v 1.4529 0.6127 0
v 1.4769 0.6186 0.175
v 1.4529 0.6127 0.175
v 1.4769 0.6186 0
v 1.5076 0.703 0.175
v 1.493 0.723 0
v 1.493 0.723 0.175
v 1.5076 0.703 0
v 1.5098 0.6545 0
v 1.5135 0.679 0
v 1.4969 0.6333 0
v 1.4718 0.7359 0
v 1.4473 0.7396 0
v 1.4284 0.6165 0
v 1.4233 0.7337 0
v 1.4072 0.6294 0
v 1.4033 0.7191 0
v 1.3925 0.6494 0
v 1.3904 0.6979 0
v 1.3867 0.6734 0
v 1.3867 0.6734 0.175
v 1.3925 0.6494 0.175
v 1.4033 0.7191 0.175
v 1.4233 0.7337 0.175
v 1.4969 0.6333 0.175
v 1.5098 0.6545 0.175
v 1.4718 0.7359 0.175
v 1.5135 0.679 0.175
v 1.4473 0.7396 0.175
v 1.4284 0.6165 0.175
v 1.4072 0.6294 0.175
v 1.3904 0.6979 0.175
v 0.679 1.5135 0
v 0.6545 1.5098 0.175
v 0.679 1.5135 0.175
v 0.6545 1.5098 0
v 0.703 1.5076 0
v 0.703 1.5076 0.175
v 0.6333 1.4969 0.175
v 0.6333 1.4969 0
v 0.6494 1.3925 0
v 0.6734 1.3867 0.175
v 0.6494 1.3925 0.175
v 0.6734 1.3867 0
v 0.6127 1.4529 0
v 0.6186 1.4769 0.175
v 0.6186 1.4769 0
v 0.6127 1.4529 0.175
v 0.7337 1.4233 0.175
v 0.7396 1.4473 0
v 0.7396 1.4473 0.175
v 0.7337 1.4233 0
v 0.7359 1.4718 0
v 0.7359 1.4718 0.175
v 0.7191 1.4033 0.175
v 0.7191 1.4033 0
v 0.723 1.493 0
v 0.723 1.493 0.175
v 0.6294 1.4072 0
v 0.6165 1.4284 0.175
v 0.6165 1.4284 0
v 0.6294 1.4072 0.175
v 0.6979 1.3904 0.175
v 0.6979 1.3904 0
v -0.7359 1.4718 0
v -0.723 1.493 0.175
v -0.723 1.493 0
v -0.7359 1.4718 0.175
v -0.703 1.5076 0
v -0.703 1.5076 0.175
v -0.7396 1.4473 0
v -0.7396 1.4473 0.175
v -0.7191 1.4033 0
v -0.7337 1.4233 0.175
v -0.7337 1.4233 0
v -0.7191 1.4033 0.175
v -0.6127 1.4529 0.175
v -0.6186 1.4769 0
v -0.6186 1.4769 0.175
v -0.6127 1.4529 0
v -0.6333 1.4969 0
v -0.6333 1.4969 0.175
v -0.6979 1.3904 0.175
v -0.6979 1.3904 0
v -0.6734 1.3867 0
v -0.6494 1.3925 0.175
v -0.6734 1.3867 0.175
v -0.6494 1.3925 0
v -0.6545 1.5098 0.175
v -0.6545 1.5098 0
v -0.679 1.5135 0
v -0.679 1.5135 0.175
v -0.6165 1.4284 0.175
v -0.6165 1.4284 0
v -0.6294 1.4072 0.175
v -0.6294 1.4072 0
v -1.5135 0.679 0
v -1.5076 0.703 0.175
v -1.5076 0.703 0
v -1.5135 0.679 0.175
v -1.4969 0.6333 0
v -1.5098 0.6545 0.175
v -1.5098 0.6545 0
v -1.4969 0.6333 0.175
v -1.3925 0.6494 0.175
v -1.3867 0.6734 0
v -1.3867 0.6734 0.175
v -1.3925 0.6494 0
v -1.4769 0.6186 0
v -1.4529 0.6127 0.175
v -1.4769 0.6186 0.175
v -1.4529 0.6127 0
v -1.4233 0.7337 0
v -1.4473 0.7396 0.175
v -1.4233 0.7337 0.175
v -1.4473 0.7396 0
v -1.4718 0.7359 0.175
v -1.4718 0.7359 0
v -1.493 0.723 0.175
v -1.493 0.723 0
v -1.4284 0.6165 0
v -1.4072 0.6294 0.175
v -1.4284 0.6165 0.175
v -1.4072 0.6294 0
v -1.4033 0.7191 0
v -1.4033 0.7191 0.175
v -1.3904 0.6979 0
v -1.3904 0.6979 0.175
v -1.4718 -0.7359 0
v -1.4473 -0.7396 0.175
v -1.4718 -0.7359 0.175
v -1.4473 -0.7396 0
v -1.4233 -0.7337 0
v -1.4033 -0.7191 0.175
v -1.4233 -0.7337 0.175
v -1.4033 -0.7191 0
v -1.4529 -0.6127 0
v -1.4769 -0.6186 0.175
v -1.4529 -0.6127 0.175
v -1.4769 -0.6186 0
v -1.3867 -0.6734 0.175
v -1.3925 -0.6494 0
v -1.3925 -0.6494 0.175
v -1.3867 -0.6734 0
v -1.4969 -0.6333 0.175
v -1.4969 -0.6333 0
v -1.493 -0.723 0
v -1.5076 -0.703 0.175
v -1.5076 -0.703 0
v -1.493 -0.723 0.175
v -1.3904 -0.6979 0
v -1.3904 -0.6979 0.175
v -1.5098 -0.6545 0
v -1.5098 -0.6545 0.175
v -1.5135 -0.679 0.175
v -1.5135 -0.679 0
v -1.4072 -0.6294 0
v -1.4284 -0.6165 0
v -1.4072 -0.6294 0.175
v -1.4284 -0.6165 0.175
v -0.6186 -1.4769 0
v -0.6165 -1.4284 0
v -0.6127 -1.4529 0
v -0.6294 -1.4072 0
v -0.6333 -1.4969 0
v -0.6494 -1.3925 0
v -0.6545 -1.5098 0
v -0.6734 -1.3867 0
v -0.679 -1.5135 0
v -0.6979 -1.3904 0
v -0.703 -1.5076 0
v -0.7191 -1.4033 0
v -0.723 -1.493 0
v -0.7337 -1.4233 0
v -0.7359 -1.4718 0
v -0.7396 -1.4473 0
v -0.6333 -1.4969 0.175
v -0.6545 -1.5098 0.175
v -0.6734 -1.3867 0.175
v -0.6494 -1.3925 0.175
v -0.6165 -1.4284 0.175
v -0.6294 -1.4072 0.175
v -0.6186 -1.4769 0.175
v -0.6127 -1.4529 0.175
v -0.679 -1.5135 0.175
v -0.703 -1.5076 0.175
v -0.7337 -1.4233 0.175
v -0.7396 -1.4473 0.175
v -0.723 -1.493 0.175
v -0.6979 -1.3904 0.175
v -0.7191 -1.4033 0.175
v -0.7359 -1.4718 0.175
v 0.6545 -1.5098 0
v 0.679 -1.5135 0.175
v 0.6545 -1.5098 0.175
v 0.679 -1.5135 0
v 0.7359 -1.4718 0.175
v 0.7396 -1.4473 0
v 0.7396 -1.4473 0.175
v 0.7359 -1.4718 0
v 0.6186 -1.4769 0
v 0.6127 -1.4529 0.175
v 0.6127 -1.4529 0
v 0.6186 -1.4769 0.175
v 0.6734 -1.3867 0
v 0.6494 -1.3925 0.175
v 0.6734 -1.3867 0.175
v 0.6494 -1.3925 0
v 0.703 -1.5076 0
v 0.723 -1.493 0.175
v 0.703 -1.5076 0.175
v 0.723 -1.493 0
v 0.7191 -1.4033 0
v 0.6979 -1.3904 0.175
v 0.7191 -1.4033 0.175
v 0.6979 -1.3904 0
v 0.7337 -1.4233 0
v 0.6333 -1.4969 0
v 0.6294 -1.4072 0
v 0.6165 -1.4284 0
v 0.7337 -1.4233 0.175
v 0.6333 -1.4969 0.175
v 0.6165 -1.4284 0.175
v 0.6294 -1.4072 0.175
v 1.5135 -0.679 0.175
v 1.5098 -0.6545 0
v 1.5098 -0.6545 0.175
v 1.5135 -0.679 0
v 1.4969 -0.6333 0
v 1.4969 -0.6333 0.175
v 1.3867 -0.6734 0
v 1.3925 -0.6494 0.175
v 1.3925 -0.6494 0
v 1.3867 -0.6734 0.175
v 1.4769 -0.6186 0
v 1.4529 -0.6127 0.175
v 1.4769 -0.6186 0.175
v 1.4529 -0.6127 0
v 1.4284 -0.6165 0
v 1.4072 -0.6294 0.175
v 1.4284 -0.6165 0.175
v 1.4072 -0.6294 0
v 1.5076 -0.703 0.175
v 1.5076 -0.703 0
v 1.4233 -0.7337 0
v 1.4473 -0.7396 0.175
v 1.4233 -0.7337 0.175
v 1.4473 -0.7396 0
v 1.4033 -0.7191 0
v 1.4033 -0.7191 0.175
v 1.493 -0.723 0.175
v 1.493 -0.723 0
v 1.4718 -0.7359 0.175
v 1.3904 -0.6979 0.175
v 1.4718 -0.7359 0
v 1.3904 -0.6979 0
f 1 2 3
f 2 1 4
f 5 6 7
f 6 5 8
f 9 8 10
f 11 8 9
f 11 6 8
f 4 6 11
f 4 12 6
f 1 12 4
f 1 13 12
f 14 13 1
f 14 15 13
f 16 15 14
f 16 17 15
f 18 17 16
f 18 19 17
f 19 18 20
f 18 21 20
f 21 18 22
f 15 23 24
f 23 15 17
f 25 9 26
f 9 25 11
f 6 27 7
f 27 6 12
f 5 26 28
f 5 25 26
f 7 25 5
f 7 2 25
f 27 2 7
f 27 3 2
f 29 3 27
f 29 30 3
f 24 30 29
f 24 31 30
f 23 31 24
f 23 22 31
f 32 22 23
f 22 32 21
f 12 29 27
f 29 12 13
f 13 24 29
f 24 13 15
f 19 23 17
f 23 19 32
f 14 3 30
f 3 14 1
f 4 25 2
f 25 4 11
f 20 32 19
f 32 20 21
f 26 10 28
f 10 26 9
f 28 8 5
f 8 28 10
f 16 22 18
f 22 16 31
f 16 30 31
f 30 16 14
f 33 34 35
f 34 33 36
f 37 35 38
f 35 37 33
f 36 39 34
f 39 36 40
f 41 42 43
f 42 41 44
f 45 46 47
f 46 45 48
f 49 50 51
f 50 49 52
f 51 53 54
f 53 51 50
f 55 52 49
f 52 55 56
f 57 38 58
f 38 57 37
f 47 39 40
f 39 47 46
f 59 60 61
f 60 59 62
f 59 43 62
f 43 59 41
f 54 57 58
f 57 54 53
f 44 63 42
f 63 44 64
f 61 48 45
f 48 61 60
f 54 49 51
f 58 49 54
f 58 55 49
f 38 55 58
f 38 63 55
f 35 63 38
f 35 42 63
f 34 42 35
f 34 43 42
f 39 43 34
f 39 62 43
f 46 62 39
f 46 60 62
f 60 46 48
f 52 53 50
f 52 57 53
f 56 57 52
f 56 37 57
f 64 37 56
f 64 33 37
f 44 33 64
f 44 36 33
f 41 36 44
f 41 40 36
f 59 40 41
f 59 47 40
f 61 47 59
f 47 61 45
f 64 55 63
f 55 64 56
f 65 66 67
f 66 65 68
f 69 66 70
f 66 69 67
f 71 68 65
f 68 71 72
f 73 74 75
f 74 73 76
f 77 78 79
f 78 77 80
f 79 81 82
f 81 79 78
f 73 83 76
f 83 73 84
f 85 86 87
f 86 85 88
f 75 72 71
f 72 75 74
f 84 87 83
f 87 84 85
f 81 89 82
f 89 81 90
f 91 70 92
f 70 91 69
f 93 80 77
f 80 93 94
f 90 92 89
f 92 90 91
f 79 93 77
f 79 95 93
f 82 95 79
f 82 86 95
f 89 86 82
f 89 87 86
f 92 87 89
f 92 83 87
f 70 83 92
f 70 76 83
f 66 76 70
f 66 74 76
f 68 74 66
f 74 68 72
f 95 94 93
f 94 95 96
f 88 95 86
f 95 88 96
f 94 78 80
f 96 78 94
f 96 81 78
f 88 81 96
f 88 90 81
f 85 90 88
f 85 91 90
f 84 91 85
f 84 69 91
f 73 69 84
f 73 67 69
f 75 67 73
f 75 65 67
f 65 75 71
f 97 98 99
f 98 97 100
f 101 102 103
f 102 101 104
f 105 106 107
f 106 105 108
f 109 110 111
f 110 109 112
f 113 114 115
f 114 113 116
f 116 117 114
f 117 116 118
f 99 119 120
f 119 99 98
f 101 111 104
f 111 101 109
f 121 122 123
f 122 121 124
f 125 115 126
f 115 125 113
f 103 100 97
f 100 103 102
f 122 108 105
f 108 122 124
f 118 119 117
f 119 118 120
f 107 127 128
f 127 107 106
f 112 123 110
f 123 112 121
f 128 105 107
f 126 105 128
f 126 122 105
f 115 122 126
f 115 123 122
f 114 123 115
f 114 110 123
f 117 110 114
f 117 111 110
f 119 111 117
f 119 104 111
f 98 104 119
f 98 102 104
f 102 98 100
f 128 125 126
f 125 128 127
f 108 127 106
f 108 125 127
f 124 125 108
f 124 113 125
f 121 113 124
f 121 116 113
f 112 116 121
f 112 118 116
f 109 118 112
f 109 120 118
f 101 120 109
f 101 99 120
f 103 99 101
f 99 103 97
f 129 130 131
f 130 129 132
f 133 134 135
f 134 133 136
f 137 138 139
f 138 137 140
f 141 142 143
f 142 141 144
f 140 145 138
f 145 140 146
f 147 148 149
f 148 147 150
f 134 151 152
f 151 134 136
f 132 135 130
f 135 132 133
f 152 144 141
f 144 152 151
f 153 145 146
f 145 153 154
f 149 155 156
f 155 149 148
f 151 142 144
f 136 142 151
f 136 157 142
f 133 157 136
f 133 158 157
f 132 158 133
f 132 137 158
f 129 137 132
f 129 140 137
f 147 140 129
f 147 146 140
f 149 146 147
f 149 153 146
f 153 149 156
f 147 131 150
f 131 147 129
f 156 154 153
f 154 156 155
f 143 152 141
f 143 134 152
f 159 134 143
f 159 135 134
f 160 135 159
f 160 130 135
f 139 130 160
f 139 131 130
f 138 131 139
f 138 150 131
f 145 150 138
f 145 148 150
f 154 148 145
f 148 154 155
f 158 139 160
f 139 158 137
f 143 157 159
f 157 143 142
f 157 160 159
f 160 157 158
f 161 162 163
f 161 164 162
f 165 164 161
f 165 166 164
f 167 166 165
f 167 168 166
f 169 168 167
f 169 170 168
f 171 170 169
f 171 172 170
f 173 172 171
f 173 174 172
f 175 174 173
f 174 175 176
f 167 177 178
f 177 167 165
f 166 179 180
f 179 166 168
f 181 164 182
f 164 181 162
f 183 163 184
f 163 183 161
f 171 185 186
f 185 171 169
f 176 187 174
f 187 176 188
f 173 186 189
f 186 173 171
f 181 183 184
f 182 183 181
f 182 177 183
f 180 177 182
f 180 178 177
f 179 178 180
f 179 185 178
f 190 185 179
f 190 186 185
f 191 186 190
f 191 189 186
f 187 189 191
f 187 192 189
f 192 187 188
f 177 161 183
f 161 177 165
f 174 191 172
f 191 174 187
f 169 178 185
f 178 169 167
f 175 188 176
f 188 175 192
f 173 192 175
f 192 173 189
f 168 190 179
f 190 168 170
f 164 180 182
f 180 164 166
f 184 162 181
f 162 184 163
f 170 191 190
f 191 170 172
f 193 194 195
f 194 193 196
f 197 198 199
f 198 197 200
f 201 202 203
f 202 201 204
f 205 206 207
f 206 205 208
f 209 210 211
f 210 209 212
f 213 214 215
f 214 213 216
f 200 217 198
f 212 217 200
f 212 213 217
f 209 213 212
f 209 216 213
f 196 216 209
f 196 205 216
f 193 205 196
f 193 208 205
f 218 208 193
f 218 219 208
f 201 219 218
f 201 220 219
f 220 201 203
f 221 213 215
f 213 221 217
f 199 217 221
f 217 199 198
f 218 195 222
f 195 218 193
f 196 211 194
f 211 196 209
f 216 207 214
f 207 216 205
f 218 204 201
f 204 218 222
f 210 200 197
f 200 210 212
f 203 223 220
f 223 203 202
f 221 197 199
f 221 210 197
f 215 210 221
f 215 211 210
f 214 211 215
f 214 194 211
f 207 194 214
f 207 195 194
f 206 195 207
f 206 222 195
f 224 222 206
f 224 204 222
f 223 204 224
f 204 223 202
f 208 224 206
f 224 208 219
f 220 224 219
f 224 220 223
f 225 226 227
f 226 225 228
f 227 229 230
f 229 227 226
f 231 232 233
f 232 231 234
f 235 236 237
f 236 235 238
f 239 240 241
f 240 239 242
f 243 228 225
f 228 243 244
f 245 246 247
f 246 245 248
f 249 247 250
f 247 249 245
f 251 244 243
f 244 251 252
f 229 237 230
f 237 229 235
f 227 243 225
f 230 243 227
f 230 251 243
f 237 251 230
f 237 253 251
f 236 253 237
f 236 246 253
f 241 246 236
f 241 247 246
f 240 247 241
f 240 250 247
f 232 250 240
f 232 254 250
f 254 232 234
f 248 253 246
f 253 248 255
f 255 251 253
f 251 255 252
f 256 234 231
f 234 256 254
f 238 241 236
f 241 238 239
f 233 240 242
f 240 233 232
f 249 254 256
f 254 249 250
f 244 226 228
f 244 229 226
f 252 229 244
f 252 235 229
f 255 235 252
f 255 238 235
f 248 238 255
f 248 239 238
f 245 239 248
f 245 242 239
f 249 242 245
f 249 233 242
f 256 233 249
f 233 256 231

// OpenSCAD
deckHeight = 0.100;

module AlignmentPin(rot)
{
  rotate(a = rot, v=[0,0,1])
    translate([1.6, 0, 0])
      cylinder(h = deckHeight + 0.075, d = 0.127, center = false, $fn = 16);
}

difference() {
  union() {
    // Basic frame
    linear_extrude(height = deckHeight, center = false, convexity = 10, slices = 10)
       import(file = "FlangeAOutline2.dxf");

    // Alignment pins
    AlignmentPin(25);
    AlignmentPin(65);
    AlignmentPin(25 + 90);
    AlignmentPin(65 + 90);
    AlignmentPin(25+ 180);
    AlignmentPin(65 + 180);
    AlignmentPin(25 + 270);
    AlignmentPin(65+ 270);
  }

  // cut center hole
  cylinder (h = 1.0, d=2.850, center=true, $fn = 250);

  // cut panel mounting holes
  translate([1.25, 1.25, 0])
     cylinder(h = 1.0, d = 0.188, center = true, $fn = 40);
  translate([-1.25, 1.25, 0])
     cylinder(h = 1.0, d = 0.188, center = true, $fn = 40);
  translate([1.25, -1.25, 0])
     cylinder(h = 1.0, d = 0.188, center = true, $fn = 40);
  translate([-1.25, -1.25, 0])
     cylinder(h = 1.0, d = 0.188, center = true, $fn = 40);

  // assembly screw holes
  translate([1, 2.75/2, 0])
    cylinder(h = 0.188 * 2, d = 0.125, center = true, $fn = 100);
  translate([-1, 2.75/2, 0])
    cylinder(h = 0.188 * 2, d = 0.125, center = true, $fn = 100);
  translate([1, -2.75/2, 0])
    cylinder(h = 0.188 * 2, d = 0.125, center = true, $fn = 100);
  translate([-1, -2.75/2, 0])
    cylinder(h = 0.188 * 2, d = 0.125, center = true, $fn = 100);
  translate([2.75/2, 1.00, 0])
    cylinder(h = 0.188 * 2, d = 0.125, center = true, $fn = 100);
  translate([-2.75/2, 1.00, 0])
    cylinder(h = 0.188 * 2, d = 0.125, center = true, $fn = 100);
  translate([2.75/2, -1.00, 0])
    cylinder(h = 0.188 * 2, d = 0.125, center = true, $fn = 100);
  translate([-2.75/2, -1.00, 0])
    cylinder(h = 0.188 * 2, d = 0.125, center = true, $fn = 100);
}
